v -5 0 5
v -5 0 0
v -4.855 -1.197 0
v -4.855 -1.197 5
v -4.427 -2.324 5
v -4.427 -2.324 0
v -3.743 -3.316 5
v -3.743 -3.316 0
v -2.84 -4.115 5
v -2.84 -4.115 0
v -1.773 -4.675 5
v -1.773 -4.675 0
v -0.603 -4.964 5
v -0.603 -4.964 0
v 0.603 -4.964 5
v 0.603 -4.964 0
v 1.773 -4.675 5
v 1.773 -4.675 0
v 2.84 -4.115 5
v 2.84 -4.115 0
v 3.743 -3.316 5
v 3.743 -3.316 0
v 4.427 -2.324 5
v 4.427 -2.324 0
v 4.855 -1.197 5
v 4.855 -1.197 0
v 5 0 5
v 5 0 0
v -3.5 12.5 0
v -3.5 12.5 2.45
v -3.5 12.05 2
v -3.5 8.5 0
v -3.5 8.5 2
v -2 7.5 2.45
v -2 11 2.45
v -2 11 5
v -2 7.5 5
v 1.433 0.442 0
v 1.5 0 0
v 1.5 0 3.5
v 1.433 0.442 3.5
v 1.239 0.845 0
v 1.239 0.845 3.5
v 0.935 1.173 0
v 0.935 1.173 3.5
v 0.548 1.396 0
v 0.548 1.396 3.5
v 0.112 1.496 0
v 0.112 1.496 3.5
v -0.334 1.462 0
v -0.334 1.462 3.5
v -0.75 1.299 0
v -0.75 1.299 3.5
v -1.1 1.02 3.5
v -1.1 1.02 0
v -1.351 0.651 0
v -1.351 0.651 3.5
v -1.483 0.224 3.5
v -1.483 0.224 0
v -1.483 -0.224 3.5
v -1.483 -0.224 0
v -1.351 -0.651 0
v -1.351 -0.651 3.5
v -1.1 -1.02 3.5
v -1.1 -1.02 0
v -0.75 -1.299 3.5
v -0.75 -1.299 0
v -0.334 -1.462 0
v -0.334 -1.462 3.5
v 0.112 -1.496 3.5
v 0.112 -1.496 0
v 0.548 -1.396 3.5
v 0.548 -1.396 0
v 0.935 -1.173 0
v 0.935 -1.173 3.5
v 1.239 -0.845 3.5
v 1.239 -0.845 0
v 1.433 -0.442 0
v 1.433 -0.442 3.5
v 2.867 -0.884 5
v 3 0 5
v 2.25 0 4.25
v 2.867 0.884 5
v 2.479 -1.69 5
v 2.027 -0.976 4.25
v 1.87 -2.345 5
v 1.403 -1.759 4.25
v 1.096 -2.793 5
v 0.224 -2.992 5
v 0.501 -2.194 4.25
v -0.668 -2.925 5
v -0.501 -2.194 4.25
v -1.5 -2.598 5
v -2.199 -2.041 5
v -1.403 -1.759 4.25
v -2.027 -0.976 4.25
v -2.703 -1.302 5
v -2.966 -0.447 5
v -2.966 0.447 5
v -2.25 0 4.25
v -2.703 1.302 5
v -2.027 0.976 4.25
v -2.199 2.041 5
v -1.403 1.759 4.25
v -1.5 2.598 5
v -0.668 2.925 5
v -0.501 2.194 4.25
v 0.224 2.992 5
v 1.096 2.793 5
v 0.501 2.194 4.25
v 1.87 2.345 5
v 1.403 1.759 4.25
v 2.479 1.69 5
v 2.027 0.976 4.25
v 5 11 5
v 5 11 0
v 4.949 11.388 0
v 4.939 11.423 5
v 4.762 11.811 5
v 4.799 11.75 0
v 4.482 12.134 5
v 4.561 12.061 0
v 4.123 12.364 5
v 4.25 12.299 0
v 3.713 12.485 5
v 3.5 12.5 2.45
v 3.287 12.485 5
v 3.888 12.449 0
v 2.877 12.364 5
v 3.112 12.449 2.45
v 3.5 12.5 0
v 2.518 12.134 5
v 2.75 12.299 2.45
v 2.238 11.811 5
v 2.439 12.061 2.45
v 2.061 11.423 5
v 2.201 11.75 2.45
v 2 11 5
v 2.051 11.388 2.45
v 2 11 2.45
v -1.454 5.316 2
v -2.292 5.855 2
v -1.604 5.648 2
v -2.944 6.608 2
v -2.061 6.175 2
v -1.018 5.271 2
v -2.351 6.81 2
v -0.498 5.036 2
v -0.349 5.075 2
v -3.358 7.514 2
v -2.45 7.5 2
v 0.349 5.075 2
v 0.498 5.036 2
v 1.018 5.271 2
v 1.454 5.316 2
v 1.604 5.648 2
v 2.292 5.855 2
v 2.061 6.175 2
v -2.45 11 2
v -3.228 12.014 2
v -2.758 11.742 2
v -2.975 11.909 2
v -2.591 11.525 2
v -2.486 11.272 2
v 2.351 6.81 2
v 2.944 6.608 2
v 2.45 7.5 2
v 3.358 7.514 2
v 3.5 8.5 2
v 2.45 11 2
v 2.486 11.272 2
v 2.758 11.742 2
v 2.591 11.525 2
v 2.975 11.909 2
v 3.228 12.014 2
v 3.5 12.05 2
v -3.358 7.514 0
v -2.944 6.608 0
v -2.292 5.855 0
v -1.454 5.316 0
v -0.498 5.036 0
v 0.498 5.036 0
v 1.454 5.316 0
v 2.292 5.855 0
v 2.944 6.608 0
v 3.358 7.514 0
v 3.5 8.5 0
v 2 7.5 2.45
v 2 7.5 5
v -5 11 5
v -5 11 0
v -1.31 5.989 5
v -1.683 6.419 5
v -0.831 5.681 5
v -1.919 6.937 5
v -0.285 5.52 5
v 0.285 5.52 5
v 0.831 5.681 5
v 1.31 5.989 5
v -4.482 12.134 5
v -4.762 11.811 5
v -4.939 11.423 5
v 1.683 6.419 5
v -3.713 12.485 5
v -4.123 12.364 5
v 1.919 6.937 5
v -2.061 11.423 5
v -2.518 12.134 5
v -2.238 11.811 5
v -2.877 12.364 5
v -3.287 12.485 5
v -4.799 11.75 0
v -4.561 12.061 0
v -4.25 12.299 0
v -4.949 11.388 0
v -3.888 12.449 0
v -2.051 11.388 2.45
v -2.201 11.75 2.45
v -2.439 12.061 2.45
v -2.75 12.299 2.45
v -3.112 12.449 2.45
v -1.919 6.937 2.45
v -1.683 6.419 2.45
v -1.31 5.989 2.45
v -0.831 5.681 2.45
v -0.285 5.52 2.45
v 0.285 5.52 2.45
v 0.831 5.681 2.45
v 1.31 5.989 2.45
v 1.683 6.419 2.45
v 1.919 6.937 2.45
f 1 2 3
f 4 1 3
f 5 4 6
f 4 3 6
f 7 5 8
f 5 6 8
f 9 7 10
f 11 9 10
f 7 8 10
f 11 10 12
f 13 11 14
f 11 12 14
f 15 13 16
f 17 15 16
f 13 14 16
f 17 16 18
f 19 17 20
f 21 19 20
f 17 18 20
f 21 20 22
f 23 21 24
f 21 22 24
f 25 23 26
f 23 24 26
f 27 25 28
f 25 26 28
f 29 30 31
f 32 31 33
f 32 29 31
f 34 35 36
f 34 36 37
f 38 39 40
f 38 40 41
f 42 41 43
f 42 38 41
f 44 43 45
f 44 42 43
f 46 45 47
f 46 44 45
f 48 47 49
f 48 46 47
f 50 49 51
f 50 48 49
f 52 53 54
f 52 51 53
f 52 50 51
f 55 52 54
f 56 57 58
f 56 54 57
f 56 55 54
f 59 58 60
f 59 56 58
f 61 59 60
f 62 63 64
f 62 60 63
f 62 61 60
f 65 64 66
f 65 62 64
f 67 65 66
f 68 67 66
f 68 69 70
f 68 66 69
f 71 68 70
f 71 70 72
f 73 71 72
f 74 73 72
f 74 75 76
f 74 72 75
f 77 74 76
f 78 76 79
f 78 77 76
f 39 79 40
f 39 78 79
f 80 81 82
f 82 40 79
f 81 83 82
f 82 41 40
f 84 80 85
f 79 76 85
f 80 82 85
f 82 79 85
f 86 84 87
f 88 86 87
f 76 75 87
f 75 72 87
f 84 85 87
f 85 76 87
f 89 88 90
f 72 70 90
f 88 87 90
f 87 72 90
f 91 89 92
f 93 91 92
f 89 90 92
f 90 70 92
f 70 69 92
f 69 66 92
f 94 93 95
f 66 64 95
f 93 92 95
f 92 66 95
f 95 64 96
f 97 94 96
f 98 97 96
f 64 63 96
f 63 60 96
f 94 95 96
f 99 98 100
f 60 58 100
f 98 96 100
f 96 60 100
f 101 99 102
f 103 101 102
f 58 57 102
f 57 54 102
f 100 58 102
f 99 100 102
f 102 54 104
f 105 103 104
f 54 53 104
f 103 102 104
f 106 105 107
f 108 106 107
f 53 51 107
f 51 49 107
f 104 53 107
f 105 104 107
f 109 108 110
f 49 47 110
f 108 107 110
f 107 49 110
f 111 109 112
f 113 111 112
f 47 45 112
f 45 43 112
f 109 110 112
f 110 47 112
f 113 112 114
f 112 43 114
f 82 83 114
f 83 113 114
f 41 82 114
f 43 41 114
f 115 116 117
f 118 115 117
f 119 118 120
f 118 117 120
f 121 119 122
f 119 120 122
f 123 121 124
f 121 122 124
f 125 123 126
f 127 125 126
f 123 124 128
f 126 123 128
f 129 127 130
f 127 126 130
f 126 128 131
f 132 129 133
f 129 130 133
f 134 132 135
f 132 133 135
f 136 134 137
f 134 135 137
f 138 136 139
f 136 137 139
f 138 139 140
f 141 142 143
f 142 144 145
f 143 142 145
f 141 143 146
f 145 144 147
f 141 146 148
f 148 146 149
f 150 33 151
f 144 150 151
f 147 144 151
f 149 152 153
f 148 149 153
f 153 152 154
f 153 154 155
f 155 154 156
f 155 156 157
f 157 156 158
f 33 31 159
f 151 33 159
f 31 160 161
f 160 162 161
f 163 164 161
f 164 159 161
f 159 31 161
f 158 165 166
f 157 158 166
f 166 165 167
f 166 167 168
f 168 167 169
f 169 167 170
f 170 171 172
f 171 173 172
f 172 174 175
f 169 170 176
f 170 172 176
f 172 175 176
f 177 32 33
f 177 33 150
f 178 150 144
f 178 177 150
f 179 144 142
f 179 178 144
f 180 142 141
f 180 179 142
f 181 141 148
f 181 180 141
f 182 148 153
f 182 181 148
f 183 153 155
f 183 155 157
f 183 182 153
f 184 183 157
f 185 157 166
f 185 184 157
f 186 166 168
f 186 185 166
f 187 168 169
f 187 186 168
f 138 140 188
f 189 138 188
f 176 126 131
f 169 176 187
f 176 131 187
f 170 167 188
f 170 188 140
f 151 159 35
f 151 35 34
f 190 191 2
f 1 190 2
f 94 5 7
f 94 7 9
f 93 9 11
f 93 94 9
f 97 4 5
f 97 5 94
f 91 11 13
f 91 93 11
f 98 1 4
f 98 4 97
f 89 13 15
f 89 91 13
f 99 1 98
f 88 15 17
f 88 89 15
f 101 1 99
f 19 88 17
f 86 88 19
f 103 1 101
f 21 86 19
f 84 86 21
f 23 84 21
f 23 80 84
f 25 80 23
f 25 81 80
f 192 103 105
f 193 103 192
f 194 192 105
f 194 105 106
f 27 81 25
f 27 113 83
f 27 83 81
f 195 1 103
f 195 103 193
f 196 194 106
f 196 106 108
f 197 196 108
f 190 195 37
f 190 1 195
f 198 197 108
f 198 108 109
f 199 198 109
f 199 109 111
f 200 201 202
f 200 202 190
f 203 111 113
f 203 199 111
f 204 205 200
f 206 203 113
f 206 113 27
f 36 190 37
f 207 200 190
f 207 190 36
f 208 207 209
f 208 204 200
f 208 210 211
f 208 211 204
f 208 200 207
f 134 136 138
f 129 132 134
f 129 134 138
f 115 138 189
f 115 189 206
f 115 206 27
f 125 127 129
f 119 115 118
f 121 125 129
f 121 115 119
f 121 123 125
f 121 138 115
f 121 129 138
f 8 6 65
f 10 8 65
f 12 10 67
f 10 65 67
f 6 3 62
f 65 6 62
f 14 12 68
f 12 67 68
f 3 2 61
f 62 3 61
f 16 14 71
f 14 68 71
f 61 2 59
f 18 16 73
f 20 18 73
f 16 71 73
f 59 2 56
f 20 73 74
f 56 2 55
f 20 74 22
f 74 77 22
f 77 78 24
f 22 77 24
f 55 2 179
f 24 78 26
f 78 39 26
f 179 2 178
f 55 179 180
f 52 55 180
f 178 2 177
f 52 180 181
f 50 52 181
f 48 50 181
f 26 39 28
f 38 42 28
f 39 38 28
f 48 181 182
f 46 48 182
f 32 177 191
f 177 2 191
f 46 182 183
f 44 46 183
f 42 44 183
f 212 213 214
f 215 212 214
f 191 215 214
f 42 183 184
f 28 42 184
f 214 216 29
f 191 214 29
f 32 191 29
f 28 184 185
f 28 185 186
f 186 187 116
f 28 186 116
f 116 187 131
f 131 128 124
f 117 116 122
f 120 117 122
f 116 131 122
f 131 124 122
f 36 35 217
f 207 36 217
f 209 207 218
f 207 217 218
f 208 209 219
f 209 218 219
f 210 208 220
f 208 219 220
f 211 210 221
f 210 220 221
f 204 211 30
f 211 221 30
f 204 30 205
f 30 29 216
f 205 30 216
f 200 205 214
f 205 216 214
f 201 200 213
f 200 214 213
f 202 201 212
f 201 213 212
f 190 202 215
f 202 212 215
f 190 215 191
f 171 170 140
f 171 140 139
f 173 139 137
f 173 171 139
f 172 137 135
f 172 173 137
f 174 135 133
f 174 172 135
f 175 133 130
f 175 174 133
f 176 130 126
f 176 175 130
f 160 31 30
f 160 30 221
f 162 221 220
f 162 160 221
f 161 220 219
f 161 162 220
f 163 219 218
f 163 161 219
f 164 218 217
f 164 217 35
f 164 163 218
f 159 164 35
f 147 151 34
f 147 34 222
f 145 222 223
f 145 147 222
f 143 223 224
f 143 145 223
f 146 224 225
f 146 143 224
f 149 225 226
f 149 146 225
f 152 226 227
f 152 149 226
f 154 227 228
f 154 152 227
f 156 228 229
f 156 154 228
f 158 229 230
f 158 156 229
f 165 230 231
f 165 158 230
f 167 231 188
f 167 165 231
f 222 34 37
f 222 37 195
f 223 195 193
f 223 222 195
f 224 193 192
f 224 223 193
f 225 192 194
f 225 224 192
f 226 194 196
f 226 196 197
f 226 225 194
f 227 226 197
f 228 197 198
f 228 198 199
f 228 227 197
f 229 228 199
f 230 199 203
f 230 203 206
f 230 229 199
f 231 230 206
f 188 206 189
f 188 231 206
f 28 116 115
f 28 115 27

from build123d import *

# Parameters (mm, degrees)
CYLINDER_R       = 1.5
CYLINDER_DEPTH   = 10
EXTRUDE001_DEPTH = 2
EXTRUDE_DEPTH    = 5
CHAMFER_SIZE     = 0.45
CHAMFER001_SIZE  = 1.5


with BuildPart() as cylinder:
    # Cylinder → Cylinder (new body)
    with BuildSketch(Plane.XY.offset(-2)):
        Circle(CYLINDER_R)
    extrude(amount=CYLINDER_DEPTH)


with BuildPart() as extrude001:
    # Sketch001 → Extrude001 (new body)
    with BuildSketch(Plane.XY):
        with BuildLine():
            ThreePointArc((3.5, 13.5), (0, 17), (-3.5, 13.5))
            Line((-3.5, 13.5), (-3.5, 8.5))
            ThreePointArc((-3.5, 8.5), (0, 5), (3.5, 8.5))
            Line((3.5, 13.5), (3.5, 8.5))
        make_face()
    extrude(amount=EXTRUDE001_DEPTH)


with BuildPart() as colgador:
    # Sketch → Extrude (new body)
    with BuildSketch(Plane.XY):
        with BuildLine():
            Line((-5, 11), (-5, 0))
            ThreePointArc((-5, 0), (0, -5), (5, 0))
            Line((5, 11), (5, 0))
            ThreePointArc((5, 11), (3.5, 12.5), (2, 11))
            Line((2, 11), (2, 7.5))
            ThreePointArc((-2, 7.5), (0, 5.5), (2, 7.5))
            Line((-2, 11), (-2, 7.5))
            ThreePointArc((-2, 11), (-3.5, 12.5), (-5, 11))
        make_face()
    extrude(amount=EXTRUDE_DEPTH)

    # Cut: cut Extrude001
    add(extrude001.part, mode=Mode.SUBTRACT)

    # Chamfer
    chamfer_edges = [colgador.edges().sort_by_distance(p)[0] for p in [
        (-2.43934, 12.06066, 2),
        (-2, 9.25, 2),
        (2, 9.25, 2),
        (2.43934, 12.06066, 2),
    ]]
    chamfer(chamfer_edges, length=CHAMFER_SIZE)

    # Cut001: cut Cylinder
    add(cylinder.part, mode=Mode.SUBTRACT)

    # Chamfer001
    chamfer001_edges = [colgador.edges().sort_by_distance(p)[0] for p in [
        (-1.5, 0, 5),
    ]]
    chamfer(chamfer001_edges, length=CHAMFER001_SIZE)


solid = colgador.part
